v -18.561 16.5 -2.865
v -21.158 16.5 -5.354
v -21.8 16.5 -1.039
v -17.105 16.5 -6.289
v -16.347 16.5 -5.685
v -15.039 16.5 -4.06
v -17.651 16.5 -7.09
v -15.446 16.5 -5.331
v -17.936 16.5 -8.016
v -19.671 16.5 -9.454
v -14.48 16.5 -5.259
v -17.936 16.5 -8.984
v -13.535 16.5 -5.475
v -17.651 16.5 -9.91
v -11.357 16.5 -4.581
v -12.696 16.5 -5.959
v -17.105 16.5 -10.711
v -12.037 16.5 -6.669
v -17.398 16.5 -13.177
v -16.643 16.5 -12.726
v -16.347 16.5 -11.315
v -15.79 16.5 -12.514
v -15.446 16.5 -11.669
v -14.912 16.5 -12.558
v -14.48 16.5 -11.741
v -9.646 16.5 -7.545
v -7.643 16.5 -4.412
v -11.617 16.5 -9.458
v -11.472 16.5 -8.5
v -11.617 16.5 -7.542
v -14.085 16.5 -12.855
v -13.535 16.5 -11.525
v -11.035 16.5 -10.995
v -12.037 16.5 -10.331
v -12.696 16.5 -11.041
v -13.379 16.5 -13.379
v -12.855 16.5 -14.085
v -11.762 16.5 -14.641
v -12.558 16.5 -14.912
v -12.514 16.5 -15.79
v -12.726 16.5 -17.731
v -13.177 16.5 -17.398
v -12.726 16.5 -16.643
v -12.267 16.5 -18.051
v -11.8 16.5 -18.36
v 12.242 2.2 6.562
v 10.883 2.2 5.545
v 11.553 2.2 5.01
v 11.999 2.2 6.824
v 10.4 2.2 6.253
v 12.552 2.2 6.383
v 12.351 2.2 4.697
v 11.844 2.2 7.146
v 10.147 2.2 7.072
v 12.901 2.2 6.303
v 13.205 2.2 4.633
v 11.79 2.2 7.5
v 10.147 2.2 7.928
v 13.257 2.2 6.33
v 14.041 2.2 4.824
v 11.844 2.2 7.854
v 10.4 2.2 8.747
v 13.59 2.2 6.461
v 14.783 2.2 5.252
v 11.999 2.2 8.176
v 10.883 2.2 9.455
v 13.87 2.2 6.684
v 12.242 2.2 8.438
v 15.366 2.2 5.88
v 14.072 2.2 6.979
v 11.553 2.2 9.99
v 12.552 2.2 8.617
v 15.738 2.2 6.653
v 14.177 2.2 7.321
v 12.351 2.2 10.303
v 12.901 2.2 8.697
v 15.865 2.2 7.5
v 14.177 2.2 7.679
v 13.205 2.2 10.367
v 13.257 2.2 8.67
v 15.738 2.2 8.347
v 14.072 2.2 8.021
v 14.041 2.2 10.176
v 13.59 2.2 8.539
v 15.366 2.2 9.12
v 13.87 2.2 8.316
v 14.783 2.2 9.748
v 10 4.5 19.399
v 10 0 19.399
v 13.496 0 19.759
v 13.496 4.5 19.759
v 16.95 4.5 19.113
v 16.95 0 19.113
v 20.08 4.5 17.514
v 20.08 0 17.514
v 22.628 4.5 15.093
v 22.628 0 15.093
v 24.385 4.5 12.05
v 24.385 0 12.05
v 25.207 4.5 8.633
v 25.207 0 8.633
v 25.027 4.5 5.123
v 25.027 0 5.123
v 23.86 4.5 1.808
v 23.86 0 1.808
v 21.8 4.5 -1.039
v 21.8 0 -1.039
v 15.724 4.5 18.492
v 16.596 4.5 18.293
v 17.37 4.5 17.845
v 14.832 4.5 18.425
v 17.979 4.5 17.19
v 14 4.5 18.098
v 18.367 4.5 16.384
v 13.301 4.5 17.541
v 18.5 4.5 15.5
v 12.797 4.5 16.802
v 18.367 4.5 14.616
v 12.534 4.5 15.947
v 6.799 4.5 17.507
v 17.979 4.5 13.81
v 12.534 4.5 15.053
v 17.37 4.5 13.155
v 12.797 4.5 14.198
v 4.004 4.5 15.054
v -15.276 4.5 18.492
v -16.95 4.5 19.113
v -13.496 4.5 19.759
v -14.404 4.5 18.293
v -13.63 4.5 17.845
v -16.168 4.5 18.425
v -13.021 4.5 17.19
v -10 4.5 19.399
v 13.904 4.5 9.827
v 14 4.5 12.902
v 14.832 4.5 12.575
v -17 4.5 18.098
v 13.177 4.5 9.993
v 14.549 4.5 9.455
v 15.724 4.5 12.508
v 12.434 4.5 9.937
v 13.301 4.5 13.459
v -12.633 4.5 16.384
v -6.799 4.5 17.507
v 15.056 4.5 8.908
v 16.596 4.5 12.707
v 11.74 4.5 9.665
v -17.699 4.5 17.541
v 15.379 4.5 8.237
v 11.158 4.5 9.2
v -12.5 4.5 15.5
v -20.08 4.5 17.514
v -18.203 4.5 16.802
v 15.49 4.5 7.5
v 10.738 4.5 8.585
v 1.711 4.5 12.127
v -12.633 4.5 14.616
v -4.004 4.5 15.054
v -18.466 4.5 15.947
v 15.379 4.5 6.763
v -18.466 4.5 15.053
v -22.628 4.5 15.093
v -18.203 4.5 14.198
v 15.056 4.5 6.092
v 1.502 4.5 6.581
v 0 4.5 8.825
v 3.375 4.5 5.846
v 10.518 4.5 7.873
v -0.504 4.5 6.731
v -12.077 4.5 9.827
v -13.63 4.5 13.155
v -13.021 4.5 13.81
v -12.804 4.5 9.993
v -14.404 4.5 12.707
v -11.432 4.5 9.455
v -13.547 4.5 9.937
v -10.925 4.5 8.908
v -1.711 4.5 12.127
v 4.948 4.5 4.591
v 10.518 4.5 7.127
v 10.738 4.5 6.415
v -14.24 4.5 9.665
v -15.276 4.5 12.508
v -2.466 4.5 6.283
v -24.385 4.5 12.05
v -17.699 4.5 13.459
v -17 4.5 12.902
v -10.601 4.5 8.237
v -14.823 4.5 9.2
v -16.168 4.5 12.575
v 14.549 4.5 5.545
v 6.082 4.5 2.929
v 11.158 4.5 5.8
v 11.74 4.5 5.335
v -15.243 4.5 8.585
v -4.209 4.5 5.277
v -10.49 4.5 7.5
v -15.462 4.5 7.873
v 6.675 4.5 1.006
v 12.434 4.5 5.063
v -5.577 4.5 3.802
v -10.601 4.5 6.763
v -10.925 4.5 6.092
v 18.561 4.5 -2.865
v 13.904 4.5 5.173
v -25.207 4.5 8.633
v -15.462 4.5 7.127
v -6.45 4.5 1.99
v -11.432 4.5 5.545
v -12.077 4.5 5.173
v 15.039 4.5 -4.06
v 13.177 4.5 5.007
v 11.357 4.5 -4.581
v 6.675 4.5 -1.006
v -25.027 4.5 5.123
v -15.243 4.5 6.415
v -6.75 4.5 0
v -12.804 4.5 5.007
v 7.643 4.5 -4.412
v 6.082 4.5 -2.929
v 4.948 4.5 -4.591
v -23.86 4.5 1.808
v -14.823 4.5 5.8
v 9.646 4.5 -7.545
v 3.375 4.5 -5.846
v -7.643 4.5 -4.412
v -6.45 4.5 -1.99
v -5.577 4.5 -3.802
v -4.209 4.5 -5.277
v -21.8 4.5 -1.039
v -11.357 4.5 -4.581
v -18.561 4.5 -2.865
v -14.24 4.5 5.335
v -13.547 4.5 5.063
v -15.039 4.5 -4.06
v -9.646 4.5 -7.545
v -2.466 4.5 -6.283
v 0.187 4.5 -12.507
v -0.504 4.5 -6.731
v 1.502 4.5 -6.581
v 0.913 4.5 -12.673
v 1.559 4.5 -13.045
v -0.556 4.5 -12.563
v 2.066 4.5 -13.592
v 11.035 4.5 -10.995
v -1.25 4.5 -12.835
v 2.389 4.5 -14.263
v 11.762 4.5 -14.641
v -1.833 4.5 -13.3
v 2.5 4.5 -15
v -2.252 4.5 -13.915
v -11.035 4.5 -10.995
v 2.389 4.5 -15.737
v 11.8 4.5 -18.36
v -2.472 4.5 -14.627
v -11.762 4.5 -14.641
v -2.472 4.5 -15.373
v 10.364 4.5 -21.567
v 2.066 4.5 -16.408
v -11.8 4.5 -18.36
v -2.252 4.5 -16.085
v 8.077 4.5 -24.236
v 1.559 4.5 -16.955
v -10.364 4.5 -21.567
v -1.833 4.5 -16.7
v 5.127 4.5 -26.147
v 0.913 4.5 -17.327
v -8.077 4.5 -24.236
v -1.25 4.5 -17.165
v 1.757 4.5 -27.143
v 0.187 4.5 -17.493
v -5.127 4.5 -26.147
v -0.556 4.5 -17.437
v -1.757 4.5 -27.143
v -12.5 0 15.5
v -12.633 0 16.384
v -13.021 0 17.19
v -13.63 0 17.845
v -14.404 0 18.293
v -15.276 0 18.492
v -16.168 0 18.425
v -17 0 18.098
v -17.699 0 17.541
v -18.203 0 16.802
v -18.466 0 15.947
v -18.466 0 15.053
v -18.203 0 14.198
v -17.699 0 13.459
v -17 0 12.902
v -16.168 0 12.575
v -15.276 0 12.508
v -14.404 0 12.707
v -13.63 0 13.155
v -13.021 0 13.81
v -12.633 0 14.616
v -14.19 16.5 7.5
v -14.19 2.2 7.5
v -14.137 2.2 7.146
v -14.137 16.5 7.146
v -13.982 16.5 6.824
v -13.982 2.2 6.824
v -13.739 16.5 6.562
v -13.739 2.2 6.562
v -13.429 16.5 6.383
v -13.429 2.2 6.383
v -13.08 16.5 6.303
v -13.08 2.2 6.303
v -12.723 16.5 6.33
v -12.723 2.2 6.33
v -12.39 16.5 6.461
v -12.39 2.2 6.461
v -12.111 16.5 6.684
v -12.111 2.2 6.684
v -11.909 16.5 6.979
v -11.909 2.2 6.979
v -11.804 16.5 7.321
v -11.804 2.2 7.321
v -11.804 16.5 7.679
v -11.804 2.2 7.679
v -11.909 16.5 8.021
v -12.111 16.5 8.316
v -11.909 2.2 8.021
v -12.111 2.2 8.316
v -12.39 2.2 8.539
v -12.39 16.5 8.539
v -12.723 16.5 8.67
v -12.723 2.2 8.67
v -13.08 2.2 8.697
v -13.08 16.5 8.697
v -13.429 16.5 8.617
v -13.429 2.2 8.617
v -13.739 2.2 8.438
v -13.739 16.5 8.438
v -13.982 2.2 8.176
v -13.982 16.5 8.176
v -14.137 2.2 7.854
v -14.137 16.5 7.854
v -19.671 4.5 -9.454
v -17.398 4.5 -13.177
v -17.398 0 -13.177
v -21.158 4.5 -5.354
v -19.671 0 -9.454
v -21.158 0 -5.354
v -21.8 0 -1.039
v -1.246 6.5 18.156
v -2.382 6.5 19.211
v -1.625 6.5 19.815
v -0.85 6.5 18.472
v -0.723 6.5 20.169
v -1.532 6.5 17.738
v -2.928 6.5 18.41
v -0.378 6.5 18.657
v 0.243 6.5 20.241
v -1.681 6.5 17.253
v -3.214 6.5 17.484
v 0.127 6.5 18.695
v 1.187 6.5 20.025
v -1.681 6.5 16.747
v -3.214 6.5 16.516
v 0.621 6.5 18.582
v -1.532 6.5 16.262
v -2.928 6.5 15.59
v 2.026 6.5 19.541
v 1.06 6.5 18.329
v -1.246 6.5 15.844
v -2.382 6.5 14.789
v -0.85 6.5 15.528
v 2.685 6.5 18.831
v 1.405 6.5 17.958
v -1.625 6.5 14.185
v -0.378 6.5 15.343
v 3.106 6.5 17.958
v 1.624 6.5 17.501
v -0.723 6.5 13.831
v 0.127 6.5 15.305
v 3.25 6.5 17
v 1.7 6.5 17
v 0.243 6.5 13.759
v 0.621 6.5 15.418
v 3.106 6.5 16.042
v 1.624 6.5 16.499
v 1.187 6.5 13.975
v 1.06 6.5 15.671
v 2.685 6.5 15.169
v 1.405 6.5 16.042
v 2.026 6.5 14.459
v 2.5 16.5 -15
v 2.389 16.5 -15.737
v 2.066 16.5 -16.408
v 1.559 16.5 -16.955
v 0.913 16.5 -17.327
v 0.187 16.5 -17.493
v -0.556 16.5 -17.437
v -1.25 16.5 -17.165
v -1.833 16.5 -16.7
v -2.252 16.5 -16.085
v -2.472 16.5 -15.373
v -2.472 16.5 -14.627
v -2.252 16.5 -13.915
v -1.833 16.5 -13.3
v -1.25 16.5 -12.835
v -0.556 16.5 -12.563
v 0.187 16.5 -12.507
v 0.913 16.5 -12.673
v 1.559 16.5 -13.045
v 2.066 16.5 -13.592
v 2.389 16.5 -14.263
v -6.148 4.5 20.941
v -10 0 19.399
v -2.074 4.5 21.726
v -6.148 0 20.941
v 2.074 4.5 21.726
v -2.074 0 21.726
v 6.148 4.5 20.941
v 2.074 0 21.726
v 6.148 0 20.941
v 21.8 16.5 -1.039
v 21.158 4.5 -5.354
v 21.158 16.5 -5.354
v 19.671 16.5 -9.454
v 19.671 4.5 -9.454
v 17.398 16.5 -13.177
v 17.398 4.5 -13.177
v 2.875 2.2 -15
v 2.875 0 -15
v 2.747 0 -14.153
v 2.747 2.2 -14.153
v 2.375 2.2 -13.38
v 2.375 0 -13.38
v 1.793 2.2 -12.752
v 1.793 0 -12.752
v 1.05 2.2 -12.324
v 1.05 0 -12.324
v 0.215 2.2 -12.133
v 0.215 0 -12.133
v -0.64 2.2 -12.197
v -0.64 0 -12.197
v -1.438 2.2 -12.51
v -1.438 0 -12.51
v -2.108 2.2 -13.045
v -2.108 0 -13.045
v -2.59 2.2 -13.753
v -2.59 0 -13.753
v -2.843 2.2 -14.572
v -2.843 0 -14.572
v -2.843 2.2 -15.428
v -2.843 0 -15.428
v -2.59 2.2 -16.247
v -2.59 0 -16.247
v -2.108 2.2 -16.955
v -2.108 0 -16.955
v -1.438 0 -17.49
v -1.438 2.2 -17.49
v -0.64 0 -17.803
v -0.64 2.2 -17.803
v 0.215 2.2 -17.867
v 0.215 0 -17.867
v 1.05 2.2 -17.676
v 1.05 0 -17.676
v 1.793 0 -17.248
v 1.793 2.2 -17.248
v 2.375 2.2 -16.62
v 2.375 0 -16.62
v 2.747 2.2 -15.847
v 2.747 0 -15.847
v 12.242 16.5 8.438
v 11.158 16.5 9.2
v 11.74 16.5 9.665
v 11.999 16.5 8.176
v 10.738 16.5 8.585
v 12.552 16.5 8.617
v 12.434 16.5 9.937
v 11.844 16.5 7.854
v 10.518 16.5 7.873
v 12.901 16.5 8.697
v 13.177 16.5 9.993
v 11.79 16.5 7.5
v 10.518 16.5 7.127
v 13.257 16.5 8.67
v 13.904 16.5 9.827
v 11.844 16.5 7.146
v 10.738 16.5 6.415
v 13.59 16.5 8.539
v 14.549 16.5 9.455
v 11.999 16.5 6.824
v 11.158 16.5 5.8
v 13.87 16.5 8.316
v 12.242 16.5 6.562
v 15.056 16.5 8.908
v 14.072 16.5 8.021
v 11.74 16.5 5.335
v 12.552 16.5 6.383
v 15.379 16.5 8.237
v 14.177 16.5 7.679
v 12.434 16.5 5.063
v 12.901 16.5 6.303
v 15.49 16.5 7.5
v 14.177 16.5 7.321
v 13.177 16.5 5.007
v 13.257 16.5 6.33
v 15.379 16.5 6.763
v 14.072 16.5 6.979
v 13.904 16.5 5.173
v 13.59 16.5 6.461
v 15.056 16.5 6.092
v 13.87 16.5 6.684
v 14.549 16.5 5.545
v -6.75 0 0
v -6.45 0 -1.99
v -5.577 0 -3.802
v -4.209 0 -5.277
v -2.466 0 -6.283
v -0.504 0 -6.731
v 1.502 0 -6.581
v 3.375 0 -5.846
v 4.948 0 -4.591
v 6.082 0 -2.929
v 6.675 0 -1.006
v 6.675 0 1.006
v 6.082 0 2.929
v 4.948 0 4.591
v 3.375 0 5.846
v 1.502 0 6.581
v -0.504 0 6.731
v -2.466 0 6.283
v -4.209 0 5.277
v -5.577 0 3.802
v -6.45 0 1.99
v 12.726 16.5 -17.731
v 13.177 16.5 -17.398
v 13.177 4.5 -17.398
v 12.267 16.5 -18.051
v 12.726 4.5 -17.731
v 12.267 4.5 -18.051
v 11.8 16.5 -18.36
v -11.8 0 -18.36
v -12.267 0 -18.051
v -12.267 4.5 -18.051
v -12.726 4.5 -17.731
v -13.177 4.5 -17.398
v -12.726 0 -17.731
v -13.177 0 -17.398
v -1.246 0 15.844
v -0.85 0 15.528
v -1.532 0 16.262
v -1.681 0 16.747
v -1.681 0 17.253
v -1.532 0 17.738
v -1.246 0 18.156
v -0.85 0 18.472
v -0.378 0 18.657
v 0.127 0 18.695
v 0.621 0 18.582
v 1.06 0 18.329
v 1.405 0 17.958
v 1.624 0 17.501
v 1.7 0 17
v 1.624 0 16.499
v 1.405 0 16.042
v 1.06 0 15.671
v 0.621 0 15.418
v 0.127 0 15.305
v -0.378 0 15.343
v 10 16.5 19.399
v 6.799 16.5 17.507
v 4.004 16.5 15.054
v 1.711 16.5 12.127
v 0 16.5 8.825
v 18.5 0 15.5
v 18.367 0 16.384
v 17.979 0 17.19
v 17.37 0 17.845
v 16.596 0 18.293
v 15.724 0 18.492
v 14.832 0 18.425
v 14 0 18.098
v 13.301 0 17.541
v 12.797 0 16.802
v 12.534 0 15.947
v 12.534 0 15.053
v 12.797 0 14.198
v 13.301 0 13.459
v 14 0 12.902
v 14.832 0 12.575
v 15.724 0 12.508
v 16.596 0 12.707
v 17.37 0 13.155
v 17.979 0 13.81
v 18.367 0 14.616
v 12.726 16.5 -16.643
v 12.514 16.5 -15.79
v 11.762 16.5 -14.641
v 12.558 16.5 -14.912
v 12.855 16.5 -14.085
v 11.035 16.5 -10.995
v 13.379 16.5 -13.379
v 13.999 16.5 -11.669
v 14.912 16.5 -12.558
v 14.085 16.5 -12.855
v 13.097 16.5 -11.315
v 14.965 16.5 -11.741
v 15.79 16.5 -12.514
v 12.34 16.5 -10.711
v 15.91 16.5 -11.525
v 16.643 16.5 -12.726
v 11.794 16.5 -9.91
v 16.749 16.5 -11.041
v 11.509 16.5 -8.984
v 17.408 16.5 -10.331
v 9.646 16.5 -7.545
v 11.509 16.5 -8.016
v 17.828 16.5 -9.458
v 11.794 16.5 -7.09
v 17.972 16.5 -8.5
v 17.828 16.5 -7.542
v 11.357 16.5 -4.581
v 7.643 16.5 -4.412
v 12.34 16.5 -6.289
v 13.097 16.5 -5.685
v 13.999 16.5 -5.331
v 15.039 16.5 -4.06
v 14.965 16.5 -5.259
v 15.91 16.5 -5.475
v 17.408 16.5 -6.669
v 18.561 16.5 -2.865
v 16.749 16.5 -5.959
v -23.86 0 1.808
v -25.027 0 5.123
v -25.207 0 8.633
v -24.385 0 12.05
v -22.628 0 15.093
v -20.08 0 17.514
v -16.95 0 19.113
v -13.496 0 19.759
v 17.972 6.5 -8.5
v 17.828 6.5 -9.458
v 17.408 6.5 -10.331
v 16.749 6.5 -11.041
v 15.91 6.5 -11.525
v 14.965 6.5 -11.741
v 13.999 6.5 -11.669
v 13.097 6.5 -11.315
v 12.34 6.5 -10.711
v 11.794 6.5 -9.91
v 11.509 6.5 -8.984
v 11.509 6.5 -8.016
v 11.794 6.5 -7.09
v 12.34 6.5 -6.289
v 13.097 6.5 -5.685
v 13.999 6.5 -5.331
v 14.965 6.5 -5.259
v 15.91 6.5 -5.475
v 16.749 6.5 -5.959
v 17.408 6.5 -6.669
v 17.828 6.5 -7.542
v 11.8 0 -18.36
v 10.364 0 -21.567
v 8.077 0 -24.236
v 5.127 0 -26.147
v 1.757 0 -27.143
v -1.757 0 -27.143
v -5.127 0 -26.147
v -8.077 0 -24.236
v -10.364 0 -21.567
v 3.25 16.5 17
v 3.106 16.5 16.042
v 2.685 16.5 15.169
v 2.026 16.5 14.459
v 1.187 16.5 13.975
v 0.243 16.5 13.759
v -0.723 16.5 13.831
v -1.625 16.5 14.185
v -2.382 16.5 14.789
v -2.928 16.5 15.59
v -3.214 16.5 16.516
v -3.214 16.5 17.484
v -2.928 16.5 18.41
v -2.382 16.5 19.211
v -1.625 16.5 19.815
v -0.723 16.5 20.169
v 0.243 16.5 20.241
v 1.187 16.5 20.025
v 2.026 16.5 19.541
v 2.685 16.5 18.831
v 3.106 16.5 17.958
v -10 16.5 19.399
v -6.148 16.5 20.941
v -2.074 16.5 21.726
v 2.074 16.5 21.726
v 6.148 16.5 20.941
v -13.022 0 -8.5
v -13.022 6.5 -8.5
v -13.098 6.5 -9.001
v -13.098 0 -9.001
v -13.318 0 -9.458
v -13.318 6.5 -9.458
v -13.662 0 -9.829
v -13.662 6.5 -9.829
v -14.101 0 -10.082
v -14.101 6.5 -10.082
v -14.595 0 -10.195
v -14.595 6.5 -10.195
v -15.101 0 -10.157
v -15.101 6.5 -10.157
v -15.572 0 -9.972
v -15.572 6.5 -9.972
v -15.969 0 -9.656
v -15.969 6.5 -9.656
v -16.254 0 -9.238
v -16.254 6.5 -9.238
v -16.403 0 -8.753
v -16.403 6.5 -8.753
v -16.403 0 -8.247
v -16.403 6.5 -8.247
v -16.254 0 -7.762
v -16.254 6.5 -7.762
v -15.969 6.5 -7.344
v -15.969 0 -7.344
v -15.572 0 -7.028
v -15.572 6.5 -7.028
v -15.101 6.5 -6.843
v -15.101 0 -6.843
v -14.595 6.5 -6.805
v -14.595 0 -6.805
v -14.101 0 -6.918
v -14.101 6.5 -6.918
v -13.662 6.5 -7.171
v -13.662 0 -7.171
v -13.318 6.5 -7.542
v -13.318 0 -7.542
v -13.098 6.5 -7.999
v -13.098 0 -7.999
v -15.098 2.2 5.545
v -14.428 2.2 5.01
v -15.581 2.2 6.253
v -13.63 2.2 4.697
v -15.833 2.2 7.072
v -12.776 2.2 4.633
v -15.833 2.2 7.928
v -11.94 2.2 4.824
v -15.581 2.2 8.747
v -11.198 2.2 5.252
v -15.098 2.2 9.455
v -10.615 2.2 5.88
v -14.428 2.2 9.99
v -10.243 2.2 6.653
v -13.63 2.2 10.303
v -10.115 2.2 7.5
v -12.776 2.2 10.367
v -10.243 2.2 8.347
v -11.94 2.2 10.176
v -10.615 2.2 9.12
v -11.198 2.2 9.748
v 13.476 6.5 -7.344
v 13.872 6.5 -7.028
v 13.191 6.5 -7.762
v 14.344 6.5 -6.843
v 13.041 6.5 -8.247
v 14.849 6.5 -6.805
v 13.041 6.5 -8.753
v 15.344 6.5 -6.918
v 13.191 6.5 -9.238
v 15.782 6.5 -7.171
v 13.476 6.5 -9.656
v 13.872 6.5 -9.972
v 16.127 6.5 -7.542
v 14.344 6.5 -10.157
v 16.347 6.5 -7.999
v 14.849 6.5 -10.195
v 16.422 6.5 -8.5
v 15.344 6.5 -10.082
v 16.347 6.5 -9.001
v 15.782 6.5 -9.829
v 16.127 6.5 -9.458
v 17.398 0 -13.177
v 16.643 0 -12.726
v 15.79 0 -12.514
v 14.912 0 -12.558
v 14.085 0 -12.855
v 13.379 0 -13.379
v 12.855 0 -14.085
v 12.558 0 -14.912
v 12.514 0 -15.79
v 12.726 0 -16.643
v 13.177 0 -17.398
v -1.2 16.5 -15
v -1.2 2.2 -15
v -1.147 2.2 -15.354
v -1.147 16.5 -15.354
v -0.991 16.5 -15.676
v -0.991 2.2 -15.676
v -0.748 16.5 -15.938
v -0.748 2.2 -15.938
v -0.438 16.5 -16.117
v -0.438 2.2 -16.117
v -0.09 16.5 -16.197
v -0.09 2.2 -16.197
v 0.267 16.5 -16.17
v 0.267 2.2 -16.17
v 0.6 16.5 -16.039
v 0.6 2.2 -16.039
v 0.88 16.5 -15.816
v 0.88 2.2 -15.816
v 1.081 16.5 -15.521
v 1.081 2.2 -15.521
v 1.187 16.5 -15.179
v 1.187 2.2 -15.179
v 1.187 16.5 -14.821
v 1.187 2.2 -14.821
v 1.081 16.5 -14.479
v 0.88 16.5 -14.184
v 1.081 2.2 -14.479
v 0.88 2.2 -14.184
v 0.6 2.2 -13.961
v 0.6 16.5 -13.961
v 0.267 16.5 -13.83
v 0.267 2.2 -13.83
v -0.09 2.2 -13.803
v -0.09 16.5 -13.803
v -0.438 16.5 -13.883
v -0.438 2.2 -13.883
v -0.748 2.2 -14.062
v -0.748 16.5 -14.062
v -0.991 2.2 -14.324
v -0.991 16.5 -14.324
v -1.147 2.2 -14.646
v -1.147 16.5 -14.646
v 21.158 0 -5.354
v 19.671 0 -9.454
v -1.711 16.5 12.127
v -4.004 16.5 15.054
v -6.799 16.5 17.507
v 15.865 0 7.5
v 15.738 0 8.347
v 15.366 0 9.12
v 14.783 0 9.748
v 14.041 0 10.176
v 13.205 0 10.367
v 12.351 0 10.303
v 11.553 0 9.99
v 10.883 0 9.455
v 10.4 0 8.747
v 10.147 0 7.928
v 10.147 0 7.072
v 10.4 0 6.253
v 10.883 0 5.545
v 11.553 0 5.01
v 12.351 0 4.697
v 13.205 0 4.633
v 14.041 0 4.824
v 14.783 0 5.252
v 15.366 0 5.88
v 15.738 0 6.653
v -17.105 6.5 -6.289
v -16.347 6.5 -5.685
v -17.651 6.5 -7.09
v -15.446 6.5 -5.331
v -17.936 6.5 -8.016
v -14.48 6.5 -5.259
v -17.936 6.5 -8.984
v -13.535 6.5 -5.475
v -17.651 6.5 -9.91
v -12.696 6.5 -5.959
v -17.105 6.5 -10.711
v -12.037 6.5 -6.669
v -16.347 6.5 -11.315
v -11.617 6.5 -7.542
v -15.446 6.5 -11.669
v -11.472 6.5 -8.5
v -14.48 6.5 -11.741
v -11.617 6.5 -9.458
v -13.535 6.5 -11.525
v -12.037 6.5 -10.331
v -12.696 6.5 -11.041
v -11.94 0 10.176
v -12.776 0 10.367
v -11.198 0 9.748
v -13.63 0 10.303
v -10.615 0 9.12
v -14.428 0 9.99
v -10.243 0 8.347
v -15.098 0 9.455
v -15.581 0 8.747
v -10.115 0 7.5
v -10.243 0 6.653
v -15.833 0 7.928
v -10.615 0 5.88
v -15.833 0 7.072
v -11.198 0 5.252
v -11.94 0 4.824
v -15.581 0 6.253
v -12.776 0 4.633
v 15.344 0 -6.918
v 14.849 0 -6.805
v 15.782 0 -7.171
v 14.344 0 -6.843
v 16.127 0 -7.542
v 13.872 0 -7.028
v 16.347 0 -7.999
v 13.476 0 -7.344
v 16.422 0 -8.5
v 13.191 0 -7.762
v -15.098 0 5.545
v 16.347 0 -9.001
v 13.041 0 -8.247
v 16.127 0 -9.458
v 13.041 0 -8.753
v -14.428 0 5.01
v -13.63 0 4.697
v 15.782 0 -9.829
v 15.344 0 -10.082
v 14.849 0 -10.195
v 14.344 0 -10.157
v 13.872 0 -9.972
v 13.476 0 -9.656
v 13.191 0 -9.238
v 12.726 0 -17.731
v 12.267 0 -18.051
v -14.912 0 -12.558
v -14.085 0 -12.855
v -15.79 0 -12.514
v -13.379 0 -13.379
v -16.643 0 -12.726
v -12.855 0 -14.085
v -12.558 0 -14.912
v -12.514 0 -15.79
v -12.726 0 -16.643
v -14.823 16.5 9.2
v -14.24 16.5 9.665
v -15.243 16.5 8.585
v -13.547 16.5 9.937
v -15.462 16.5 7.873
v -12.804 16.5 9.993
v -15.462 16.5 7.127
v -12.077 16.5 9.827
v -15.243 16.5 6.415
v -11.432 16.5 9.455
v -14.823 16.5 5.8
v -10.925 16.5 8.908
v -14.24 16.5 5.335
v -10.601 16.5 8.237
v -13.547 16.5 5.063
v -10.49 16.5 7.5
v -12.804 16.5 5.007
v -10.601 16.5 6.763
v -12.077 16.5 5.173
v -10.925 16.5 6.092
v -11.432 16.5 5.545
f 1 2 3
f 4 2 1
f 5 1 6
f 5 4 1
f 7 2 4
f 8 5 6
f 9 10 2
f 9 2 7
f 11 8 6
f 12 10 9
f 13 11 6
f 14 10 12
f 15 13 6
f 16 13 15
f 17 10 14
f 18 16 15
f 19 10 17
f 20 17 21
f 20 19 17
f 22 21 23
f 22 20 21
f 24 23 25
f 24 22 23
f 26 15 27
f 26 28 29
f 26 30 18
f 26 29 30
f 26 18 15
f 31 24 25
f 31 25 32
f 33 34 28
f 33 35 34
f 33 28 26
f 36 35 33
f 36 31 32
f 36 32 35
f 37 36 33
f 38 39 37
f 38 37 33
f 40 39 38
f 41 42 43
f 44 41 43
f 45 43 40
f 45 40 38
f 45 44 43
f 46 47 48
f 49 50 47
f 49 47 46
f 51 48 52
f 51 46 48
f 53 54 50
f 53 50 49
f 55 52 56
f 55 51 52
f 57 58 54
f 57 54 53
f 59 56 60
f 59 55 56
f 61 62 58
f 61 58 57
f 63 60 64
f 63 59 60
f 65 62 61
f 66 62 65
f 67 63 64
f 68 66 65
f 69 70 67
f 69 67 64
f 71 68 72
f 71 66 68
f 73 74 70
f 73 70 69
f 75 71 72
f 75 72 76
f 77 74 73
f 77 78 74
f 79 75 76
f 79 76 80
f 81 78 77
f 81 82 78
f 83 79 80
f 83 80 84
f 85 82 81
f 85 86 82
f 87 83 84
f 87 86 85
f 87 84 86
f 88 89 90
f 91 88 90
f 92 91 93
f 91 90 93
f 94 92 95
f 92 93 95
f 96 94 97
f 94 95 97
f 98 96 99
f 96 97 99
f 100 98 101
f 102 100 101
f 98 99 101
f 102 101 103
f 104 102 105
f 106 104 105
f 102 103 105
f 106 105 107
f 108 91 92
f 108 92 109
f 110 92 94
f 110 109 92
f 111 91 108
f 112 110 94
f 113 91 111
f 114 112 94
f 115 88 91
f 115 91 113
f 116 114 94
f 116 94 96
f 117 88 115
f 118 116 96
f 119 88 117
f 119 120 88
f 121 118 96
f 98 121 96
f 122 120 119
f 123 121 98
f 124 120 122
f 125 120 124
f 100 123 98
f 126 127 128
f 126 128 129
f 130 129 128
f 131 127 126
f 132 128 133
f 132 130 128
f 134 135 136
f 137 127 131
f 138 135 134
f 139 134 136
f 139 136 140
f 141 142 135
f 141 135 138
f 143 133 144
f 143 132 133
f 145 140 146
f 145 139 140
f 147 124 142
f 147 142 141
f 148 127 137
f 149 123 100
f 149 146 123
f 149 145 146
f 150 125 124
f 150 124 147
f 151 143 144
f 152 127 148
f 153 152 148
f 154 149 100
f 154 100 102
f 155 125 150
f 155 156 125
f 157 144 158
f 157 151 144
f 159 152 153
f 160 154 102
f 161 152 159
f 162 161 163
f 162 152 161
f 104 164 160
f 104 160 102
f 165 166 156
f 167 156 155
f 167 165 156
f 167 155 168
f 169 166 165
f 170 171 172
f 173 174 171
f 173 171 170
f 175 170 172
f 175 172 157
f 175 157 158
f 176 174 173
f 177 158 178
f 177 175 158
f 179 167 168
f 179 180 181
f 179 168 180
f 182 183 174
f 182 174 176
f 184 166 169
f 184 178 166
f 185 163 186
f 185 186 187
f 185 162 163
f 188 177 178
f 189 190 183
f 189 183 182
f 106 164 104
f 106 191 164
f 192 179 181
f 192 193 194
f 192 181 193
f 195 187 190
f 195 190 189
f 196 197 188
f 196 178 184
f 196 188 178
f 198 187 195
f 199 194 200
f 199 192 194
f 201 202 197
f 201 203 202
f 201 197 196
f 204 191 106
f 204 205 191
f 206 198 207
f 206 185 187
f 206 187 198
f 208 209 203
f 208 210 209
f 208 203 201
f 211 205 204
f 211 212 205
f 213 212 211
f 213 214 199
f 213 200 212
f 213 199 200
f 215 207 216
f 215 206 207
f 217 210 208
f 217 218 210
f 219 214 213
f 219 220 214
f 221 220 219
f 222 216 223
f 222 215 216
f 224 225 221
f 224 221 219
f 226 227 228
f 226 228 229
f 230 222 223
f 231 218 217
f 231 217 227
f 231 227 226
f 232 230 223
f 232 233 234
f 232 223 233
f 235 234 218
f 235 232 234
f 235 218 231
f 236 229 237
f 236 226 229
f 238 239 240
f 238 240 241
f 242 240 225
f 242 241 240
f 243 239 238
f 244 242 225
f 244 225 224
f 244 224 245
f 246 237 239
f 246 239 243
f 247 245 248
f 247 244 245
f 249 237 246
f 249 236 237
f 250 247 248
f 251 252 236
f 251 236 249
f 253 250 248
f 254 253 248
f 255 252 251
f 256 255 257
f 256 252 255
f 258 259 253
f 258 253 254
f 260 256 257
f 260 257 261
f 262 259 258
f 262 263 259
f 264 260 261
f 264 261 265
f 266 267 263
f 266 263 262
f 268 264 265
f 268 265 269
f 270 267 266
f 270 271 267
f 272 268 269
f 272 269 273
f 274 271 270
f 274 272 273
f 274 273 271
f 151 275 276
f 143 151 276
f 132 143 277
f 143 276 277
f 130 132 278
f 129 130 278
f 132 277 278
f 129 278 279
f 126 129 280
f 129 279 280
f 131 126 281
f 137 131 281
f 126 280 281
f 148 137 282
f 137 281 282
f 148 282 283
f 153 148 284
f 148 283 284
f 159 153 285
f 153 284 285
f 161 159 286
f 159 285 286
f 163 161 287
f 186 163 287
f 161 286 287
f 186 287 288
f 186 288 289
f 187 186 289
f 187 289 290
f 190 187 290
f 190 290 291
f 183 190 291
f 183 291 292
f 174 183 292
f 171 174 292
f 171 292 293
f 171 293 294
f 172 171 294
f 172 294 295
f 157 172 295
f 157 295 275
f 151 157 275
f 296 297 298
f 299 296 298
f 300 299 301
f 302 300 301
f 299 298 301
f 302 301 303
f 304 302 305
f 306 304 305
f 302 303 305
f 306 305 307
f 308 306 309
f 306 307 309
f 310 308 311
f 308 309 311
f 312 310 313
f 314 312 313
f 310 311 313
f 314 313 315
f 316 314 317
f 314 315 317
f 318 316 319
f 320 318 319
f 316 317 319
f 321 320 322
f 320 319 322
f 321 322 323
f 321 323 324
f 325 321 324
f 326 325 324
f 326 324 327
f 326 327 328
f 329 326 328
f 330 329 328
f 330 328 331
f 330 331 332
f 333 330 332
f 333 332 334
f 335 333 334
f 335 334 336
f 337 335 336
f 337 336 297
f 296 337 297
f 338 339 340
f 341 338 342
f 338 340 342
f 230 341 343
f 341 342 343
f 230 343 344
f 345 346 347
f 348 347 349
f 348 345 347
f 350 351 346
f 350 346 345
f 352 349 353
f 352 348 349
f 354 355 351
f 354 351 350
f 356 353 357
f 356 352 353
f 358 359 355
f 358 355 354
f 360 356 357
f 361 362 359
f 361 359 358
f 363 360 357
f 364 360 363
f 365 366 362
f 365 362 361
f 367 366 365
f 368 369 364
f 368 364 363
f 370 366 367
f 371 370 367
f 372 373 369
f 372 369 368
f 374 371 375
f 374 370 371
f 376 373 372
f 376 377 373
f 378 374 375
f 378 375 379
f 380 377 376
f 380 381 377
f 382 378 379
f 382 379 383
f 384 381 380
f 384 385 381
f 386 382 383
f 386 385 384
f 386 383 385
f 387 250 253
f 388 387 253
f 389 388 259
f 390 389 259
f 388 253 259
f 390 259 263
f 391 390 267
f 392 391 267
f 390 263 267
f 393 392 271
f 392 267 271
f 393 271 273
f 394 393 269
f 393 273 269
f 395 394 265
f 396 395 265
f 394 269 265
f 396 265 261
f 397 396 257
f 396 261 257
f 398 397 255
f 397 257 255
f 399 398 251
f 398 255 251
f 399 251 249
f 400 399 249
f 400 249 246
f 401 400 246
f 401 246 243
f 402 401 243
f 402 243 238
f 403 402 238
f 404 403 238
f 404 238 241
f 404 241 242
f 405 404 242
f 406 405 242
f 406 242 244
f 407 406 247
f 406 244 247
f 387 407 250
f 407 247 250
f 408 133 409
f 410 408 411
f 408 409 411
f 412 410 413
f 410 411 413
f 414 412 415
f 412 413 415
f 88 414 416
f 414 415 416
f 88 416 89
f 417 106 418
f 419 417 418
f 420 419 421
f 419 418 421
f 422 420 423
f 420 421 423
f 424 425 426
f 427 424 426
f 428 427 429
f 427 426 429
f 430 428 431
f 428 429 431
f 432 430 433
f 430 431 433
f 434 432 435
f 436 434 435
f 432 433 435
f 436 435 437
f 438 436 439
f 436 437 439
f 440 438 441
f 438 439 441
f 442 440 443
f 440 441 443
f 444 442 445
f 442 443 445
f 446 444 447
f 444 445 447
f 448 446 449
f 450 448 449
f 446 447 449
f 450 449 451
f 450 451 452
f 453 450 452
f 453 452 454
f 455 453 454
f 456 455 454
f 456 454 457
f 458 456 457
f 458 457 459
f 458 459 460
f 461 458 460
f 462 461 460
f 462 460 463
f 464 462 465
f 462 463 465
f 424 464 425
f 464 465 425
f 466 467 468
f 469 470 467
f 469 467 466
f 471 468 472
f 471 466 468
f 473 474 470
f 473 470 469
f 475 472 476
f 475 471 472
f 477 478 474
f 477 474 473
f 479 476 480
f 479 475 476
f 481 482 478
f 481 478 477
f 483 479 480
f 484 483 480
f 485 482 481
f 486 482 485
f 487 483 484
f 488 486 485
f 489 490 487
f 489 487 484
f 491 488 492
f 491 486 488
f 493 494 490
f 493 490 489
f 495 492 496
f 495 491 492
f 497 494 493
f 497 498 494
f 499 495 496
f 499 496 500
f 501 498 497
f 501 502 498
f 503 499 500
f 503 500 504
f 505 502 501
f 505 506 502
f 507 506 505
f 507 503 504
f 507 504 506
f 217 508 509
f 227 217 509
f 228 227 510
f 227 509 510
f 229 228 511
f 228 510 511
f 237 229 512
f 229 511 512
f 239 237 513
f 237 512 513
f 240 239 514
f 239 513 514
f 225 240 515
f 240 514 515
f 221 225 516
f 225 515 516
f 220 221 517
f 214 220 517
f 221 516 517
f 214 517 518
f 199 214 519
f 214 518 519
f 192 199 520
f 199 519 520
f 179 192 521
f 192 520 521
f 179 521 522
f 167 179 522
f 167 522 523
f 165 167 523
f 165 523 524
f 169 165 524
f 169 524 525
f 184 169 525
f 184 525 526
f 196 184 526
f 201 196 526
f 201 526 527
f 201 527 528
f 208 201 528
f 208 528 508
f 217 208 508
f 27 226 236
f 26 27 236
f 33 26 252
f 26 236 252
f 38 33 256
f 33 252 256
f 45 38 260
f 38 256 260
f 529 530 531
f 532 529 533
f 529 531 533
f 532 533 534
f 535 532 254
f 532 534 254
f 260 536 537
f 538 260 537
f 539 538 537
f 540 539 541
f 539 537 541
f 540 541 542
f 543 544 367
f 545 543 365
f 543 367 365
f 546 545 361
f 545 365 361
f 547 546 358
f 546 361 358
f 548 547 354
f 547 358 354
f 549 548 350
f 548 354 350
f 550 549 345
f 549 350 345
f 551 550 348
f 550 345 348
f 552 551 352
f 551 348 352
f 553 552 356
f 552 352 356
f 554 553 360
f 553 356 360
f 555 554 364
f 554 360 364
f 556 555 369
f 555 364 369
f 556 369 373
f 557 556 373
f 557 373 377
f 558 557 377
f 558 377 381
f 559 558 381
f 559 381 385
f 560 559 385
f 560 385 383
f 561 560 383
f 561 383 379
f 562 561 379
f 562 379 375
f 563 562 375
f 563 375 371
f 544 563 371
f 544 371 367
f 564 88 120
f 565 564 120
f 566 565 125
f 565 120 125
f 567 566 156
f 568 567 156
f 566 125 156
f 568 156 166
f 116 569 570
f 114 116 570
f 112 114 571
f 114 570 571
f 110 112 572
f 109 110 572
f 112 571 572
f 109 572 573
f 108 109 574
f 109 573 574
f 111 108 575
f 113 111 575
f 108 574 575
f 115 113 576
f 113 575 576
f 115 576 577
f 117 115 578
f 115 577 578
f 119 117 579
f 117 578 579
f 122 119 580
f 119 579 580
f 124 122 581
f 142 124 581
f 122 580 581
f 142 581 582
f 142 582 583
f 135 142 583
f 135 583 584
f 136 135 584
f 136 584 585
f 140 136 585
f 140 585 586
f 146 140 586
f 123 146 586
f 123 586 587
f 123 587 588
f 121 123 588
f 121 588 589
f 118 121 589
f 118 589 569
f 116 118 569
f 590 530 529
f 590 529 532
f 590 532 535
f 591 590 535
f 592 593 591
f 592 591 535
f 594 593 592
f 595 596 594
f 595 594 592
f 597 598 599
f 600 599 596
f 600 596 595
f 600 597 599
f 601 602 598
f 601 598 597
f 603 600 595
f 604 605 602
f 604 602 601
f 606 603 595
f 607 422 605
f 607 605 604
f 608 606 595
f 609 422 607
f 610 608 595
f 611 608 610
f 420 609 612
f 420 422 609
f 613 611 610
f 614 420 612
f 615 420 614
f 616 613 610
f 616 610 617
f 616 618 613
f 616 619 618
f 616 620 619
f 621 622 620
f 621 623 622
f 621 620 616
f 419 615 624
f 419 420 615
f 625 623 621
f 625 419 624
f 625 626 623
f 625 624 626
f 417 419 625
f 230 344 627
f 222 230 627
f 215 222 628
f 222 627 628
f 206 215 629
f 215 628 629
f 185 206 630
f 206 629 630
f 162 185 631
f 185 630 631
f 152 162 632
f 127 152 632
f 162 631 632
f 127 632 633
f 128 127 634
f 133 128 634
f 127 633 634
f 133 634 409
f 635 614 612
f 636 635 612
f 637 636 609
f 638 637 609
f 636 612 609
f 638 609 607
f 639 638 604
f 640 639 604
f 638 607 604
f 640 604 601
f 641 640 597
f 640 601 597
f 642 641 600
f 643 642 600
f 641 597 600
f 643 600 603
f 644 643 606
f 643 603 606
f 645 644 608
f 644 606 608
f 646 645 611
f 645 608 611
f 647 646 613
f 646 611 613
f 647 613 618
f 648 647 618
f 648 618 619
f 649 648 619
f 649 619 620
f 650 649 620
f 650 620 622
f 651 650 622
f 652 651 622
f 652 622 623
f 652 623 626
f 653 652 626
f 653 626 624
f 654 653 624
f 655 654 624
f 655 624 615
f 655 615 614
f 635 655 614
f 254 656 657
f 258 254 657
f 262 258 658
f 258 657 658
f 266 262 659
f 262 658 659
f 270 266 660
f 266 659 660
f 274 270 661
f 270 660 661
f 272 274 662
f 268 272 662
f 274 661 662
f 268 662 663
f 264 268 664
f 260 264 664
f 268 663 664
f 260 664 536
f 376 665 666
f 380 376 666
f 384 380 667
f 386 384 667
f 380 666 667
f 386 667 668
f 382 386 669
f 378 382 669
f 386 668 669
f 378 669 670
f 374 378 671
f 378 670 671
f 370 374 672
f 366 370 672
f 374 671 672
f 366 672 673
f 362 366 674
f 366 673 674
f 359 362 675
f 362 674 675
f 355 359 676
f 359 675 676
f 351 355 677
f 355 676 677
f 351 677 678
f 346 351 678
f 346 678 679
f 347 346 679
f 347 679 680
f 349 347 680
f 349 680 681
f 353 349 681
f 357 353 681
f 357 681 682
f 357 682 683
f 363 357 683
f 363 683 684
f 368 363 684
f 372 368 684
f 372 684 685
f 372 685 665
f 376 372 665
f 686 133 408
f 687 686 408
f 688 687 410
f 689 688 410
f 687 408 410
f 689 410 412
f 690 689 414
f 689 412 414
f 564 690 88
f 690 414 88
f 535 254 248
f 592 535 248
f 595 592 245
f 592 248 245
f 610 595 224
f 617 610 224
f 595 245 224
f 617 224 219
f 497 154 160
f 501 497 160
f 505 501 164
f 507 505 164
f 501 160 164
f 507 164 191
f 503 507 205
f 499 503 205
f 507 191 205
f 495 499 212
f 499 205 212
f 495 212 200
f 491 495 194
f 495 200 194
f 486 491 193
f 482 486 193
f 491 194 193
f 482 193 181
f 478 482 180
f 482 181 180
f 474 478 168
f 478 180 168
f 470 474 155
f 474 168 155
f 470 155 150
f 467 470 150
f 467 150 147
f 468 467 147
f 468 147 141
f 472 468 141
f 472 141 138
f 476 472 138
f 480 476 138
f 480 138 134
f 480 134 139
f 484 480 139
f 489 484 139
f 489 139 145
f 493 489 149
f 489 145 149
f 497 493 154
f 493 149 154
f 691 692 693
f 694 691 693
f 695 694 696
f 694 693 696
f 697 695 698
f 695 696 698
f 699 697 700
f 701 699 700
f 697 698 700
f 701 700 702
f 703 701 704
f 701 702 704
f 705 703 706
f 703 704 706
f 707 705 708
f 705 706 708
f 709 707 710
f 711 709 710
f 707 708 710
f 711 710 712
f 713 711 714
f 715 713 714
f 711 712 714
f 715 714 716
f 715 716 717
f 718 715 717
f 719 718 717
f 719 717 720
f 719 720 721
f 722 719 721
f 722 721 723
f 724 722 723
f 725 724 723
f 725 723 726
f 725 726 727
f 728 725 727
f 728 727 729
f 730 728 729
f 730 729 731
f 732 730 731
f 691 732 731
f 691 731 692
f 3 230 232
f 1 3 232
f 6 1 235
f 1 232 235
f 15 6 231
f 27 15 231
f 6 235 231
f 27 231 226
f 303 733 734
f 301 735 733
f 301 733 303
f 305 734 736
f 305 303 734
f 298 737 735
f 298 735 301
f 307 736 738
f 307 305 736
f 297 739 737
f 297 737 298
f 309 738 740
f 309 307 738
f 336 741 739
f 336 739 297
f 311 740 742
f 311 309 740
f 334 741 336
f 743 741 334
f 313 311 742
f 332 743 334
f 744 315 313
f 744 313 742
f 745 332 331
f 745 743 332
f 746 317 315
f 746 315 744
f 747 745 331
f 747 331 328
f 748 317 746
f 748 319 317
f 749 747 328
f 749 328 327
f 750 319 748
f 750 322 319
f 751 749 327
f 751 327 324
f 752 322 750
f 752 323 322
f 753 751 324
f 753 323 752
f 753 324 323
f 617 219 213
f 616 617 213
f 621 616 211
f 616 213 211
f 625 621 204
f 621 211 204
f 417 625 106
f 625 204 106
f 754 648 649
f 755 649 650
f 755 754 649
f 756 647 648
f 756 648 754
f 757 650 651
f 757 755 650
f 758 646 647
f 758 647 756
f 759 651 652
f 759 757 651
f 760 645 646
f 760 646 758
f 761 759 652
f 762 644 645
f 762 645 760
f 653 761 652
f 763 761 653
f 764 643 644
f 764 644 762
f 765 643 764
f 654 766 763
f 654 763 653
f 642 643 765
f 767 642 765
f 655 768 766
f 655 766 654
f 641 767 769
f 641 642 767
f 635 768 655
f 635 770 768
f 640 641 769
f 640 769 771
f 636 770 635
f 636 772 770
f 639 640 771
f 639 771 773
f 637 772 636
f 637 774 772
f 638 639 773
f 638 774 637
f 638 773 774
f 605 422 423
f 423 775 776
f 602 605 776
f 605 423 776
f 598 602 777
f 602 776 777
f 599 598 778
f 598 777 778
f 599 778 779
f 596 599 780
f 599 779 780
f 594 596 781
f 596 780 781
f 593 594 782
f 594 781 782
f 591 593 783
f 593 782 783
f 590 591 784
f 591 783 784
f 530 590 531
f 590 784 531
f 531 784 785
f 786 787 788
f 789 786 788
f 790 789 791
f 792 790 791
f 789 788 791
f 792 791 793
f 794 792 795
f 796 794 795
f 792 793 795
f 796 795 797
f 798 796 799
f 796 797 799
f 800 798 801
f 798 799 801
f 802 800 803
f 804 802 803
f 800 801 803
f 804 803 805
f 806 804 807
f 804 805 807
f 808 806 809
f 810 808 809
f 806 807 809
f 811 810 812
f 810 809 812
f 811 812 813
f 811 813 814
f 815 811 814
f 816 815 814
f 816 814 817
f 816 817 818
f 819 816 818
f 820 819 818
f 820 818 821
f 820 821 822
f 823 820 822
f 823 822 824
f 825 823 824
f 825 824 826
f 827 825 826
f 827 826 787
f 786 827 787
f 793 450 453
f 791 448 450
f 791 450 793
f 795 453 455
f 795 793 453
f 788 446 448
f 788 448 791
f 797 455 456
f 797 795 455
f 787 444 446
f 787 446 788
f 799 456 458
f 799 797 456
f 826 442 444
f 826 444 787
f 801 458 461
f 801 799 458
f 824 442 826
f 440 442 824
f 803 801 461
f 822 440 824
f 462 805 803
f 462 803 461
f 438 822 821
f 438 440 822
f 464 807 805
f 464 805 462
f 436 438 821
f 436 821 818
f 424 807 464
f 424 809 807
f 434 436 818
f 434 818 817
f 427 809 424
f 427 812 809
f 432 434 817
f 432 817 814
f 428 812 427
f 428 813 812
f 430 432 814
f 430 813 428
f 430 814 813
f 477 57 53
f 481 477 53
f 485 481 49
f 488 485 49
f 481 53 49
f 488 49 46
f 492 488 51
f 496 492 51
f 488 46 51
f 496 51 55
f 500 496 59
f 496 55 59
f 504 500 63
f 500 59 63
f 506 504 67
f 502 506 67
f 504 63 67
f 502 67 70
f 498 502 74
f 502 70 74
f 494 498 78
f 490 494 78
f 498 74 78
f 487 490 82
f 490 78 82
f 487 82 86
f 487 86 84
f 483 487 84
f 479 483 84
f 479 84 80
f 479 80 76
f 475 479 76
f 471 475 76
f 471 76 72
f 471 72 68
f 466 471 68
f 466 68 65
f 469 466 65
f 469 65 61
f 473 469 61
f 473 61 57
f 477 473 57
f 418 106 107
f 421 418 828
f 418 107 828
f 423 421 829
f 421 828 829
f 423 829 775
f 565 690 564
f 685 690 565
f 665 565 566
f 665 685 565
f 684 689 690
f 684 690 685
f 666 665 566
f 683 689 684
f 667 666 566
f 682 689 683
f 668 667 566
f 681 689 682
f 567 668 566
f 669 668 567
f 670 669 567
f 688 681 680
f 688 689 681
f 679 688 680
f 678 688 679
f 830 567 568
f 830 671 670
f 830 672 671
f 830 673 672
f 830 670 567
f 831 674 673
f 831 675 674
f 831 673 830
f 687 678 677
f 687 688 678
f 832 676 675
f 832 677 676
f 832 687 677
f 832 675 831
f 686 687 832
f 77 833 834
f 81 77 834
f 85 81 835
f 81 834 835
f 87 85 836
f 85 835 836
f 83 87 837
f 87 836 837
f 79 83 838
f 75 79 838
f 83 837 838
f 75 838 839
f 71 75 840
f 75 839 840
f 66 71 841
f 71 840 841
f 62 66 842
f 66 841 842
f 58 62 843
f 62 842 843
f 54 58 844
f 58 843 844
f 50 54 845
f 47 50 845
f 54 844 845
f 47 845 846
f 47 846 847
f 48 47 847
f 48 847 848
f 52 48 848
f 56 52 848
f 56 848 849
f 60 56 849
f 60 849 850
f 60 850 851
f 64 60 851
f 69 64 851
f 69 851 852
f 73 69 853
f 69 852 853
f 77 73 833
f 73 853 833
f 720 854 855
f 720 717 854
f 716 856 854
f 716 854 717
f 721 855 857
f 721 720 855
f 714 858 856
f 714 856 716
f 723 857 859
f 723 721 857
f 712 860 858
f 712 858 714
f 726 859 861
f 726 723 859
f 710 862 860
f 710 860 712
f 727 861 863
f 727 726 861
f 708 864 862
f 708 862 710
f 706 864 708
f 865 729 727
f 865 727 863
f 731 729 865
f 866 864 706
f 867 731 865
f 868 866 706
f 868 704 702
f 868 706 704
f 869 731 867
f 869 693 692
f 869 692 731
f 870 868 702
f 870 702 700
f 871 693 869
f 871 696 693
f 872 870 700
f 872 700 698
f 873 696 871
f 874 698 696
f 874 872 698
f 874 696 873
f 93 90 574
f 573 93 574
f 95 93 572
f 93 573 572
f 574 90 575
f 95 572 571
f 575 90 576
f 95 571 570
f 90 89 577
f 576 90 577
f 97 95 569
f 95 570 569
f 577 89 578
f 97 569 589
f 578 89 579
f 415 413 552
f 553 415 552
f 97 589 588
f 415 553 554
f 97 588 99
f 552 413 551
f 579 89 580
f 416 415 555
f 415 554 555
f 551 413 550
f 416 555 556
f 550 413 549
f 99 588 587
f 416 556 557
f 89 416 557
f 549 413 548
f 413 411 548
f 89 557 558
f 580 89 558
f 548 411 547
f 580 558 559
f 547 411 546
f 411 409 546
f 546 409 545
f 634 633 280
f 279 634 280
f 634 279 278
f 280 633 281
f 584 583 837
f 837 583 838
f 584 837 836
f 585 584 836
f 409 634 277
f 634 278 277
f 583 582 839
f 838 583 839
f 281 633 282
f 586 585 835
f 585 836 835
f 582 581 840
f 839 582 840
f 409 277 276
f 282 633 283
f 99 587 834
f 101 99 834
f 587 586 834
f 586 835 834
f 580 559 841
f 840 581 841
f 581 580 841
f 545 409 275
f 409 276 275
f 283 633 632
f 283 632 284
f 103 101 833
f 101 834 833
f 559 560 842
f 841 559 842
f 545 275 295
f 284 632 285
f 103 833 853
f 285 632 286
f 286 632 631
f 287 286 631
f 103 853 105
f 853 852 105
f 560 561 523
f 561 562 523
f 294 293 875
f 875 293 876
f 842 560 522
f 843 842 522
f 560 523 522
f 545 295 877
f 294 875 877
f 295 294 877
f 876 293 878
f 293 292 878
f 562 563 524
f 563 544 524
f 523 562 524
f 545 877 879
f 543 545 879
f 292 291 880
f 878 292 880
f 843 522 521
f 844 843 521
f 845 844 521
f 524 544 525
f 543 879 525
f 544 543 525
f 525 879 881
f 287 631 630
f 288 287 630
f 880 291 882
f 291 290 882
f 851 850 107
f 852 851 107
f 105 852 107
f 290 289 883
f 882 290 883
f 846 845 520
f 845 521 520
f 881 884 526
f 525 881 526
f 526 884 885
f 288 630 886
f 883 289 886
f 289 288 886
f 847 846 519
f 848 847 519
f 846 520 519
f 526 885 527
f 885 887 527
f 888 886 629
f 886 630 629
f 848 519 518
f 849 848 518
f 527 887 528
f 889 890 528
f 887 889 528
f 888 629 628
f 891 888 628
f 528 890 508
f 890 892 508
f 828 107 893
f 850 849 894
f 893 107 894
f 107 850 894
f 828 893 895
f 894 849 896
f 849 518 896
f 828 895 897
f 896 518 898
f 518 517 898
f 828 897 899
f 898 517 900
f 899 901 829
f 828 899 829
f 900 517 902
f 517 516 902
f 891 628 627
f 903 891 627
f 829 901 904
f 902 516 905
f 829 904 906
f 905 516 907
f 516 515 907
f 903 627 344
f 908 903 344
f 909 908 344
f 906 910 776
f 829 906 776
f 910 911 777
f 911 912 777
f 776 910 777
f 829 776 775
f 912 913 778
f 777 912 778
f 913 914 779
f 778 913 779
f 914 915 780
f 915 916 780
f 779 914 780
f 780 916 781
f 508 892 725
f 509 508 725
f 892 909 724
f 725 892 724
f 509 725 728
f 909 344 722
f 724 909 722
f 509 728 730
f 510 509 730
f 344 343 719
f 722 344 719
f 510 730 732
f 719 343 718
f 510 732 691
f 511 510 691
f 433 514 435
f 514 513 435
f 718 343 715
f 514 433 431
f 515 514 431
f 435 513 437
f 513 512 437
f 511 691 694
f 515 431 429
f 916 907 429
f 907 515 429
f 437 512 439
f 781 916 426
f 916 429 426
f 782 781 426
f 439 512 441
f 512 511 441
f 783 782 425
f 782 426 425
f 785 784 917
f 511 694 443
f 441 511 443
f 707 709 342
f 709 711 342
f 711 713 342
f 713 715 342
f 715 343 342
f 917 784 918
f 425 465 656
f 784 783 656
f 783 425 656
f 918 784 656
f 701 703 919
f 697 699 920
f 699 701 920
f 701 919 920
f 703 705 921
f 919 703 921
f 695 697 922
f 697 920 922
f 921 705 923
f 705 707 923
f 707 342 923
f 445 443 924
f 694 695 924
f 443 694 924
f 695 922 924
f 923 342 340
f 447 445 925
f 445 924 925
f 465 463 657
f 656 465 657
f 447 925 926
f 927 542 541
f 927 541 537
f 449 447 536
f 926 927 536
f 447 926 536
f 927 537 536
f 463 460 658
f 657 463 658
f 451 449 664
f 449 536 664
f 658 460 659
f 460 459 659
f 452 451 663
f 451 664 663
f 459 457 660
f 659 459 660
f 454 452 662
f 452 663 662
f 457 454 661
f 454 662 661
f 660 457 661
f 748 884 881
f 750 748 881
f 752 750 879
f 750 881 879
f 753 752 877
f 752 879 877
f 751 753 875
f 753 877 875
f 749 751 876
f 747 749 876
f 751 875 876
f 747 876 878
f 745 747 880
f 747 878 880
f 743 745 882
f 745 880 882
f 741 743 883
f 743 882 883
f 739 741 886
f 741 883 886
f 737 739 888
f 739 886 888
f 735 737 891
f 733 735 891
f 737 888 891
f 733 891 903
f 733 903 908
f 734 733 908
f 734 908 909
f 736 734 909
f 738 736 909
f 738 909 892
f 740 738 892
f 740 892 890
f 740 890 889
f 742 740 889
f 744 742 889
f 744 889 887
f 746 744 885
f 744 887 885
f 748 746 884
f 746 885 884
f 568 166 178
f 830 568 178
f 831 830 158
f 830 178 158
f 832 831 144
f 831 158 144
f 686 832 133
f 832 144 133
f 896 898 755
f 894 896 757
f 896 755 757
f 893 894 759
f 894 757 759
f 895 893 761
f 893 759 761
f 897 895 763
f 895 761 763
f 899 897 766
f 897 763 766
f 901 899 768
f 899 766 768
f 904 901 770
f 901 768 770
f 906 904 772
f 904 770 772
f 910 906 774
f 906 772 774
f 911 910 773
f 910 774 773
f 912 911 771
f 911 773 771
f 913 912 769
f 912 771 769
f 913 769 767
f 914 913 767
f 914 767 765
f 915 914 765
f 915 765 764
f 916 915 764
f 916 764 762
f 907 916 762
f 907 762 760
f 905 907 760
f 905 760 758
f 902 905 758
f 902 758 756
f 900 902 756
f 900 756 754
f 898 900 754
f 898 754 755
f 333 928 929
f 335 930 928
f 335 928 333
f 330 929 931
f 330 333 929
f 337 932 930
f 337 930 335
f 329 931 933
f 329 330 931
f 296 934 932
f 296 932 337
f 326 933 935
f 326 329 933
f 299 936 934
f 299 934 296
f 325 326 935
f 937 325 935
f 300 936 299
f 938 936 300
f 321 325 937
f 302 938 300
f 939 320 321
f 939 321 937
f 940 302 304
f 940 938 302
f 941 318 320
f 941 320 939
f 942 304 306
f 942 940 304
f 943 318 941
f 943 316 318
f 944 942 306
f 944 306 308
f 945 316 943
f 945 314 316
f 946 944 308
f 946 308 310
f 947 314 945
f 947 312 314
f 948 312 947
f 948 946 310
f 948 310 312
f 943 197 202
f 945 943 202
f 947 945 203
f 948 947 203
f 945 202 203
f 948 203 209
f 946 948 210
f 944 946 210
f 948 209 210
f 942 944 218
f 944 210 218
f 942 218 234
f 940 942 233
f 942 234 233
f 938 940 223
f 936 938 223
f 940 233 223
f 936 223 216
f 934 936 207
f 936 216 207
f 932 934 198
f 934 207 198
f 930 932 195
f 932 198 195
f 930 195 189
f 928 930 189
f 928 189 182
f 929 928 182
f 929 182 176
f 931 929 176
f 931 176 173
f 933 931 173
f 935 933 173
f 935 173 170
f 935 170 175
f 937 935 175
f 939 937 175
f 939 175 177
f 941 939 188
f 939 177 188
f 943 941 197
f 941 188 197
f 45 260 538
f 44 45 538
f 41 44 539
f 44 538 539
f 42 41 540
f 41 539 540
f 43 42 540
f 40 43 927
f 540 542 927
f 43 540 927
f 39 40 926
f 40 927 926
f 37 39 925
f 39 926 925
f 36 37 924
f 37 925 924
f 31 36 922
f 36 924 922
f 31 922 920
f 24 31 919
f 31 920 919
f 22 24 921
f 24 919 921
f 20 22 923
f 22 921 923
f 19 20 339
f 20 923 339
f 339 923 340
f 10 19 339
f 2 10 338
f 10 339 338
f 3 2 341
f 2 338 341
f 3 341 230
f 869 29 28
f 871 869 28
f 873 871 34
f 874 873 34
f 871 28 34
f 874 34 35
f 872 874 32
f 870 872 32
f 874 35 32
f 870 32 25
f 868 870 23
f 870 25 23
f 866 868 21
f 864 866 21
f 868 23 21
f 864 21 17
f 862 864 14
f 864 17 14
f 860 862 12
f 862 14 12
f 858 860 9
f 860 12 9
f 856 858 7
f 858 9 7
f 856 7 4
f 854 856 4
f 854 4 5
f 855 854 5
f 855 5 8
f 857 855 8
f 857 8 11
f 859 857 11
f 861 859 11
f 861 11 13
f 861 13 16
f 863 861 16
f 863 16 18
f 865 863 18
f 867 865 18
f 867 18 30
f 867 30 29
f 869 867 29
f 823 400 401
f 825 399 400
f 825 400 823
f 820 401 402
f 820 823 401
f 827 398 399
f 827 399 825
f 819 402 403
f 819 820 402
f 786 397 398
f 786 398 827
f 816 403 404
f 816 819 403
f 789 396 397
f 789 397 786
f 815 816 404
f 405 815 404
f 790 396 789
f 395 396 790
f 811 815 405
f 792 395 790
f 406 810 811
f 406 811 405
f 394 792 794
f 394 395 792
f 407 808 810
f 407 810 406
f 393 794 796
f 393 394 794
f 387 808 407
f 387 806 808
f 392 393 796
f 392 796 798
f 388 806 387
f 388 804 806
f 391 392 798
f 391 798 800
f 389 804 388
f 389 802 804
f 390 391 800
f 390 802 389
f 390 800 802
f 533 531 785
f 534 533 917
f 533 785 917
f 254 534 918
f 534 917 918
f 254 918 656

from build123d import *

# Parameters (mm, degrees)
CROQUIS1_R                                           = 21.825
SALIENTE_EXTRUIR1_DEPTH                              = 4.5
CROQUIS2_R                                           = 2.5
SALIENTE_EXTRUIR2_DEPTH                              = 12
TALADRO_DE_MARGEN_PARA_M121_D                        = 13.5
SALIENTE_EXTRUIR3_DEPTH                              = 12
CROQUIS8_R                                           = 1.7
CORTAR_EXTRUIR1_DEPTH                                = 16.5
MATRIZC1_COUNT                                       = 3
TALADRO_DE_MARGEN_PARA_M21_D                         = 2.4
SALIENTE_EXTRUIR5_DEPTH                              = 4.5
MATRIZC2_COUNT                                       = 3
CROQUIS12_R                                          = 2.875
CORTAR_EXTRUIR2_DEPTH                                = 2.2
CROQUIS13_R                                          = 3
CORTAR_EXTRUIR3_DEPTH                                = 16.5
REFRENTADO_PARA_TORNILLO_CON_CABEZA_PLAN_D           = 3.4
REFRENTADO_PARA_TORNILLO_CON_CABEZA_PLAN_CBORE_D     = 6.5
REFRENTADO_PARA_TORNILLO_CON_CABEZA_PLAN_CBORE_DEPTH = 10


with BuildPart() as part:
    # Croquis1 → Saliente-Extruir1 (new body)
    with BuildSketch(Plane(origin=(0, 0, 0), x_dir=(1, 0, 0), z_dir=(0, 1, 0))):
        Circle(CROQUIS1_R)
    extrude(amount=SALIENTE_EXTRUIR1_DEPTH)

    # Croquis2 → Saliente-Extruir2 (add)
    with BuildSketch(Plane(origin=(0, 4.5, 0), x_dir=(1, 0, 0), z_dir=(0, 1, 0))):
        with Locations((0, 15)):
            Circle(CROQUIS2_R)
        with Locations((12.990381057, -7.5)):
            Circle(CROQUIS2_R)
        with Locations((-12.990381057, -7.5)):
            Circle(CROQUIS2_R)
    extrude(amount=SALIENTE_EXTRUIR2_DEPTH)

    # Taladro de margen para M121 (through all)
    with Locations(Plane(origin=(0, 4.5, 0), x_dir=(1, 0, 0), z_dir=(0, 1, 0))):
        with Locations((0, 0)):
            Hole(TALADRO_DE_MARGEN_PARA_M121_D / 2)

    # Croquis5 → Saliente-Extruir3 (add)
    with BuildSketch(Plane(origin=(0, 4.5, 0), x_dir=(1, 0, 0), z_dir=(0, 1, 0))):
        with BuildLine():
            ThreePointArc((-7.642674188, 4.4125), (-11.035446071, 10.994501306), (-11.800237164, 18.359875487))
            ThreePointArc((-11.800237164, 18.359875487), (-18.901004438, 10.9125), (-21.800237164, 1.039367411))
            ThreePointArc((-21.800237164, 1.039367411), (-15.039240468, 4.059725986), (-7.642674188, 4.4125))
        make_face()
    saliente_extruir3 = extrude(amount=SALIENTE_EXTRUIR3_DEPTH)

    # Croquis8 → Cortar-Extruir1 (cut)
    with BuildSketch(Plane(origin=(0, 16.5, 0), x_dir=(1, 0, 0), z_dir=(0, 1, 0))):
        with Locations((-14.722431864, 8.5)):
            Circle(CROQUIS8_R)
    cortar_extruir1 = extrude(amount=-CORTAR_EXTRUIR1_DEPTH, mode=Mode.SUBTRACT)

    # MatrizC1: Saliente-Extruir3, Cortar-Extruir1 ×3 about axis
    matrizc1_axis = Axis((0, 0, 0), (0, 1, 0))
    for i in range(1, MATRIZC1_COUNT):
        add(saliente_extruir3.rotate(matrizc1_axis, i * 360 / MATRIZC1_COUNT))
        add(cortar_extruir1.rotate(matrizc1_axis, i * 360 / MATRIZC1_COUNT), mode=Mode.SUBTRACT)

    # Taladro de margen para M21 (through all)
    with Locations(Plane(origin=(0, 16.5, 0), x_dir=(1, 0, 0), z_dir=(0, 1, 0))):
        with Locations((12.990381057, -7.5), (-12.990381057, -7.5), (0, 15)):
            Hole(TALADRO_DE_MARGEN_PARA_M21_D / 2)

    # Croquis11 → Saliente-Extruir5 (add)
    with BuildSketch(Plane.XZ):
        with BuildLine():
            ThreePointArc((-10, 19.399242898), (-18.901004438, 10.9125), (-21.800237164, -1.039367411))
            ThreePointArc((-21.800237164, -1.039367411), (-23.615858472, 13.634622246), (-10, 19.399242898))
        make_face()
    saliente_extruir5 = extrude(amount=-SALIENTE_EXTRUIR5_DEPTH)

    # MatrizC2: Saliente-Extruir5 ×3 about axis
    matrizc2_axis = Axis((0, 0, 0), (0, 1, 0))
    for i in range(1, MATRIZC2_COUNT):
        add(saliente_extruir5.rotate(matrizc2_axis, i * 360 / MATRIZC2_COUNT))

    # Croquis12 → Cortar-Extruir2 (cut)
    with BuildSketch(Plane.XZ):
        with Locations((-12.990381057, 7.5)):
            Circle(CROQUIS12_R)
        with Locations((12.990381057, 7.5)):
            Circle(CROQUIS12_R)
        with Locations((0, -15)):
            Circle(CROQUIS12_R)
    extrude(amount=-CORTAR_EXTRUIR2_DEPTH, mode=Mode.SUBTRACT)

    # Croquis13 → Cortar-Extruir3 (cut)
    with BuildSketch(Plane.XZ):
        with Locations((15.5, -15.5)):
            Circle(CROQUIS13_R)
        with Locations((-15.5, -15.5)):
            Circle(CROQUIS13_R)
        with Locations((-15.5, 15.5)):
            Circle(CROQUIS13_R)
        with Locations((15.5, 15.5)):
            Circle(CROQUIS13_R)
    extrude(amount=-CORTAR_EXTRUIR3_DEPTH, mode=Mode.SUBTRACT)

    # Refrentado para tornillo con cabeza plana de M31 (through all)
    with Locations(Plane(origin=(0, 16.5, 0), x_dir=(1, 0, 0), z_dir=(0, 1, 0))):
        with Locations((-14.722431864, 8.5), (0, -17), (14.722431864, 8.5)):
            CounterBoreHole(REFRENTADO_PARA_TORNILLO_CON_CABEZA_PLAN_D / 2, REFRENTADO_PARA_TORNILLO_CON_CABEZA_PLAN_CBORE_D / 2, REFRENTADO_PARA_TORNILLO_CON_CABEZA_PLAN_CBORE_DEPTH)


solid = part.part
